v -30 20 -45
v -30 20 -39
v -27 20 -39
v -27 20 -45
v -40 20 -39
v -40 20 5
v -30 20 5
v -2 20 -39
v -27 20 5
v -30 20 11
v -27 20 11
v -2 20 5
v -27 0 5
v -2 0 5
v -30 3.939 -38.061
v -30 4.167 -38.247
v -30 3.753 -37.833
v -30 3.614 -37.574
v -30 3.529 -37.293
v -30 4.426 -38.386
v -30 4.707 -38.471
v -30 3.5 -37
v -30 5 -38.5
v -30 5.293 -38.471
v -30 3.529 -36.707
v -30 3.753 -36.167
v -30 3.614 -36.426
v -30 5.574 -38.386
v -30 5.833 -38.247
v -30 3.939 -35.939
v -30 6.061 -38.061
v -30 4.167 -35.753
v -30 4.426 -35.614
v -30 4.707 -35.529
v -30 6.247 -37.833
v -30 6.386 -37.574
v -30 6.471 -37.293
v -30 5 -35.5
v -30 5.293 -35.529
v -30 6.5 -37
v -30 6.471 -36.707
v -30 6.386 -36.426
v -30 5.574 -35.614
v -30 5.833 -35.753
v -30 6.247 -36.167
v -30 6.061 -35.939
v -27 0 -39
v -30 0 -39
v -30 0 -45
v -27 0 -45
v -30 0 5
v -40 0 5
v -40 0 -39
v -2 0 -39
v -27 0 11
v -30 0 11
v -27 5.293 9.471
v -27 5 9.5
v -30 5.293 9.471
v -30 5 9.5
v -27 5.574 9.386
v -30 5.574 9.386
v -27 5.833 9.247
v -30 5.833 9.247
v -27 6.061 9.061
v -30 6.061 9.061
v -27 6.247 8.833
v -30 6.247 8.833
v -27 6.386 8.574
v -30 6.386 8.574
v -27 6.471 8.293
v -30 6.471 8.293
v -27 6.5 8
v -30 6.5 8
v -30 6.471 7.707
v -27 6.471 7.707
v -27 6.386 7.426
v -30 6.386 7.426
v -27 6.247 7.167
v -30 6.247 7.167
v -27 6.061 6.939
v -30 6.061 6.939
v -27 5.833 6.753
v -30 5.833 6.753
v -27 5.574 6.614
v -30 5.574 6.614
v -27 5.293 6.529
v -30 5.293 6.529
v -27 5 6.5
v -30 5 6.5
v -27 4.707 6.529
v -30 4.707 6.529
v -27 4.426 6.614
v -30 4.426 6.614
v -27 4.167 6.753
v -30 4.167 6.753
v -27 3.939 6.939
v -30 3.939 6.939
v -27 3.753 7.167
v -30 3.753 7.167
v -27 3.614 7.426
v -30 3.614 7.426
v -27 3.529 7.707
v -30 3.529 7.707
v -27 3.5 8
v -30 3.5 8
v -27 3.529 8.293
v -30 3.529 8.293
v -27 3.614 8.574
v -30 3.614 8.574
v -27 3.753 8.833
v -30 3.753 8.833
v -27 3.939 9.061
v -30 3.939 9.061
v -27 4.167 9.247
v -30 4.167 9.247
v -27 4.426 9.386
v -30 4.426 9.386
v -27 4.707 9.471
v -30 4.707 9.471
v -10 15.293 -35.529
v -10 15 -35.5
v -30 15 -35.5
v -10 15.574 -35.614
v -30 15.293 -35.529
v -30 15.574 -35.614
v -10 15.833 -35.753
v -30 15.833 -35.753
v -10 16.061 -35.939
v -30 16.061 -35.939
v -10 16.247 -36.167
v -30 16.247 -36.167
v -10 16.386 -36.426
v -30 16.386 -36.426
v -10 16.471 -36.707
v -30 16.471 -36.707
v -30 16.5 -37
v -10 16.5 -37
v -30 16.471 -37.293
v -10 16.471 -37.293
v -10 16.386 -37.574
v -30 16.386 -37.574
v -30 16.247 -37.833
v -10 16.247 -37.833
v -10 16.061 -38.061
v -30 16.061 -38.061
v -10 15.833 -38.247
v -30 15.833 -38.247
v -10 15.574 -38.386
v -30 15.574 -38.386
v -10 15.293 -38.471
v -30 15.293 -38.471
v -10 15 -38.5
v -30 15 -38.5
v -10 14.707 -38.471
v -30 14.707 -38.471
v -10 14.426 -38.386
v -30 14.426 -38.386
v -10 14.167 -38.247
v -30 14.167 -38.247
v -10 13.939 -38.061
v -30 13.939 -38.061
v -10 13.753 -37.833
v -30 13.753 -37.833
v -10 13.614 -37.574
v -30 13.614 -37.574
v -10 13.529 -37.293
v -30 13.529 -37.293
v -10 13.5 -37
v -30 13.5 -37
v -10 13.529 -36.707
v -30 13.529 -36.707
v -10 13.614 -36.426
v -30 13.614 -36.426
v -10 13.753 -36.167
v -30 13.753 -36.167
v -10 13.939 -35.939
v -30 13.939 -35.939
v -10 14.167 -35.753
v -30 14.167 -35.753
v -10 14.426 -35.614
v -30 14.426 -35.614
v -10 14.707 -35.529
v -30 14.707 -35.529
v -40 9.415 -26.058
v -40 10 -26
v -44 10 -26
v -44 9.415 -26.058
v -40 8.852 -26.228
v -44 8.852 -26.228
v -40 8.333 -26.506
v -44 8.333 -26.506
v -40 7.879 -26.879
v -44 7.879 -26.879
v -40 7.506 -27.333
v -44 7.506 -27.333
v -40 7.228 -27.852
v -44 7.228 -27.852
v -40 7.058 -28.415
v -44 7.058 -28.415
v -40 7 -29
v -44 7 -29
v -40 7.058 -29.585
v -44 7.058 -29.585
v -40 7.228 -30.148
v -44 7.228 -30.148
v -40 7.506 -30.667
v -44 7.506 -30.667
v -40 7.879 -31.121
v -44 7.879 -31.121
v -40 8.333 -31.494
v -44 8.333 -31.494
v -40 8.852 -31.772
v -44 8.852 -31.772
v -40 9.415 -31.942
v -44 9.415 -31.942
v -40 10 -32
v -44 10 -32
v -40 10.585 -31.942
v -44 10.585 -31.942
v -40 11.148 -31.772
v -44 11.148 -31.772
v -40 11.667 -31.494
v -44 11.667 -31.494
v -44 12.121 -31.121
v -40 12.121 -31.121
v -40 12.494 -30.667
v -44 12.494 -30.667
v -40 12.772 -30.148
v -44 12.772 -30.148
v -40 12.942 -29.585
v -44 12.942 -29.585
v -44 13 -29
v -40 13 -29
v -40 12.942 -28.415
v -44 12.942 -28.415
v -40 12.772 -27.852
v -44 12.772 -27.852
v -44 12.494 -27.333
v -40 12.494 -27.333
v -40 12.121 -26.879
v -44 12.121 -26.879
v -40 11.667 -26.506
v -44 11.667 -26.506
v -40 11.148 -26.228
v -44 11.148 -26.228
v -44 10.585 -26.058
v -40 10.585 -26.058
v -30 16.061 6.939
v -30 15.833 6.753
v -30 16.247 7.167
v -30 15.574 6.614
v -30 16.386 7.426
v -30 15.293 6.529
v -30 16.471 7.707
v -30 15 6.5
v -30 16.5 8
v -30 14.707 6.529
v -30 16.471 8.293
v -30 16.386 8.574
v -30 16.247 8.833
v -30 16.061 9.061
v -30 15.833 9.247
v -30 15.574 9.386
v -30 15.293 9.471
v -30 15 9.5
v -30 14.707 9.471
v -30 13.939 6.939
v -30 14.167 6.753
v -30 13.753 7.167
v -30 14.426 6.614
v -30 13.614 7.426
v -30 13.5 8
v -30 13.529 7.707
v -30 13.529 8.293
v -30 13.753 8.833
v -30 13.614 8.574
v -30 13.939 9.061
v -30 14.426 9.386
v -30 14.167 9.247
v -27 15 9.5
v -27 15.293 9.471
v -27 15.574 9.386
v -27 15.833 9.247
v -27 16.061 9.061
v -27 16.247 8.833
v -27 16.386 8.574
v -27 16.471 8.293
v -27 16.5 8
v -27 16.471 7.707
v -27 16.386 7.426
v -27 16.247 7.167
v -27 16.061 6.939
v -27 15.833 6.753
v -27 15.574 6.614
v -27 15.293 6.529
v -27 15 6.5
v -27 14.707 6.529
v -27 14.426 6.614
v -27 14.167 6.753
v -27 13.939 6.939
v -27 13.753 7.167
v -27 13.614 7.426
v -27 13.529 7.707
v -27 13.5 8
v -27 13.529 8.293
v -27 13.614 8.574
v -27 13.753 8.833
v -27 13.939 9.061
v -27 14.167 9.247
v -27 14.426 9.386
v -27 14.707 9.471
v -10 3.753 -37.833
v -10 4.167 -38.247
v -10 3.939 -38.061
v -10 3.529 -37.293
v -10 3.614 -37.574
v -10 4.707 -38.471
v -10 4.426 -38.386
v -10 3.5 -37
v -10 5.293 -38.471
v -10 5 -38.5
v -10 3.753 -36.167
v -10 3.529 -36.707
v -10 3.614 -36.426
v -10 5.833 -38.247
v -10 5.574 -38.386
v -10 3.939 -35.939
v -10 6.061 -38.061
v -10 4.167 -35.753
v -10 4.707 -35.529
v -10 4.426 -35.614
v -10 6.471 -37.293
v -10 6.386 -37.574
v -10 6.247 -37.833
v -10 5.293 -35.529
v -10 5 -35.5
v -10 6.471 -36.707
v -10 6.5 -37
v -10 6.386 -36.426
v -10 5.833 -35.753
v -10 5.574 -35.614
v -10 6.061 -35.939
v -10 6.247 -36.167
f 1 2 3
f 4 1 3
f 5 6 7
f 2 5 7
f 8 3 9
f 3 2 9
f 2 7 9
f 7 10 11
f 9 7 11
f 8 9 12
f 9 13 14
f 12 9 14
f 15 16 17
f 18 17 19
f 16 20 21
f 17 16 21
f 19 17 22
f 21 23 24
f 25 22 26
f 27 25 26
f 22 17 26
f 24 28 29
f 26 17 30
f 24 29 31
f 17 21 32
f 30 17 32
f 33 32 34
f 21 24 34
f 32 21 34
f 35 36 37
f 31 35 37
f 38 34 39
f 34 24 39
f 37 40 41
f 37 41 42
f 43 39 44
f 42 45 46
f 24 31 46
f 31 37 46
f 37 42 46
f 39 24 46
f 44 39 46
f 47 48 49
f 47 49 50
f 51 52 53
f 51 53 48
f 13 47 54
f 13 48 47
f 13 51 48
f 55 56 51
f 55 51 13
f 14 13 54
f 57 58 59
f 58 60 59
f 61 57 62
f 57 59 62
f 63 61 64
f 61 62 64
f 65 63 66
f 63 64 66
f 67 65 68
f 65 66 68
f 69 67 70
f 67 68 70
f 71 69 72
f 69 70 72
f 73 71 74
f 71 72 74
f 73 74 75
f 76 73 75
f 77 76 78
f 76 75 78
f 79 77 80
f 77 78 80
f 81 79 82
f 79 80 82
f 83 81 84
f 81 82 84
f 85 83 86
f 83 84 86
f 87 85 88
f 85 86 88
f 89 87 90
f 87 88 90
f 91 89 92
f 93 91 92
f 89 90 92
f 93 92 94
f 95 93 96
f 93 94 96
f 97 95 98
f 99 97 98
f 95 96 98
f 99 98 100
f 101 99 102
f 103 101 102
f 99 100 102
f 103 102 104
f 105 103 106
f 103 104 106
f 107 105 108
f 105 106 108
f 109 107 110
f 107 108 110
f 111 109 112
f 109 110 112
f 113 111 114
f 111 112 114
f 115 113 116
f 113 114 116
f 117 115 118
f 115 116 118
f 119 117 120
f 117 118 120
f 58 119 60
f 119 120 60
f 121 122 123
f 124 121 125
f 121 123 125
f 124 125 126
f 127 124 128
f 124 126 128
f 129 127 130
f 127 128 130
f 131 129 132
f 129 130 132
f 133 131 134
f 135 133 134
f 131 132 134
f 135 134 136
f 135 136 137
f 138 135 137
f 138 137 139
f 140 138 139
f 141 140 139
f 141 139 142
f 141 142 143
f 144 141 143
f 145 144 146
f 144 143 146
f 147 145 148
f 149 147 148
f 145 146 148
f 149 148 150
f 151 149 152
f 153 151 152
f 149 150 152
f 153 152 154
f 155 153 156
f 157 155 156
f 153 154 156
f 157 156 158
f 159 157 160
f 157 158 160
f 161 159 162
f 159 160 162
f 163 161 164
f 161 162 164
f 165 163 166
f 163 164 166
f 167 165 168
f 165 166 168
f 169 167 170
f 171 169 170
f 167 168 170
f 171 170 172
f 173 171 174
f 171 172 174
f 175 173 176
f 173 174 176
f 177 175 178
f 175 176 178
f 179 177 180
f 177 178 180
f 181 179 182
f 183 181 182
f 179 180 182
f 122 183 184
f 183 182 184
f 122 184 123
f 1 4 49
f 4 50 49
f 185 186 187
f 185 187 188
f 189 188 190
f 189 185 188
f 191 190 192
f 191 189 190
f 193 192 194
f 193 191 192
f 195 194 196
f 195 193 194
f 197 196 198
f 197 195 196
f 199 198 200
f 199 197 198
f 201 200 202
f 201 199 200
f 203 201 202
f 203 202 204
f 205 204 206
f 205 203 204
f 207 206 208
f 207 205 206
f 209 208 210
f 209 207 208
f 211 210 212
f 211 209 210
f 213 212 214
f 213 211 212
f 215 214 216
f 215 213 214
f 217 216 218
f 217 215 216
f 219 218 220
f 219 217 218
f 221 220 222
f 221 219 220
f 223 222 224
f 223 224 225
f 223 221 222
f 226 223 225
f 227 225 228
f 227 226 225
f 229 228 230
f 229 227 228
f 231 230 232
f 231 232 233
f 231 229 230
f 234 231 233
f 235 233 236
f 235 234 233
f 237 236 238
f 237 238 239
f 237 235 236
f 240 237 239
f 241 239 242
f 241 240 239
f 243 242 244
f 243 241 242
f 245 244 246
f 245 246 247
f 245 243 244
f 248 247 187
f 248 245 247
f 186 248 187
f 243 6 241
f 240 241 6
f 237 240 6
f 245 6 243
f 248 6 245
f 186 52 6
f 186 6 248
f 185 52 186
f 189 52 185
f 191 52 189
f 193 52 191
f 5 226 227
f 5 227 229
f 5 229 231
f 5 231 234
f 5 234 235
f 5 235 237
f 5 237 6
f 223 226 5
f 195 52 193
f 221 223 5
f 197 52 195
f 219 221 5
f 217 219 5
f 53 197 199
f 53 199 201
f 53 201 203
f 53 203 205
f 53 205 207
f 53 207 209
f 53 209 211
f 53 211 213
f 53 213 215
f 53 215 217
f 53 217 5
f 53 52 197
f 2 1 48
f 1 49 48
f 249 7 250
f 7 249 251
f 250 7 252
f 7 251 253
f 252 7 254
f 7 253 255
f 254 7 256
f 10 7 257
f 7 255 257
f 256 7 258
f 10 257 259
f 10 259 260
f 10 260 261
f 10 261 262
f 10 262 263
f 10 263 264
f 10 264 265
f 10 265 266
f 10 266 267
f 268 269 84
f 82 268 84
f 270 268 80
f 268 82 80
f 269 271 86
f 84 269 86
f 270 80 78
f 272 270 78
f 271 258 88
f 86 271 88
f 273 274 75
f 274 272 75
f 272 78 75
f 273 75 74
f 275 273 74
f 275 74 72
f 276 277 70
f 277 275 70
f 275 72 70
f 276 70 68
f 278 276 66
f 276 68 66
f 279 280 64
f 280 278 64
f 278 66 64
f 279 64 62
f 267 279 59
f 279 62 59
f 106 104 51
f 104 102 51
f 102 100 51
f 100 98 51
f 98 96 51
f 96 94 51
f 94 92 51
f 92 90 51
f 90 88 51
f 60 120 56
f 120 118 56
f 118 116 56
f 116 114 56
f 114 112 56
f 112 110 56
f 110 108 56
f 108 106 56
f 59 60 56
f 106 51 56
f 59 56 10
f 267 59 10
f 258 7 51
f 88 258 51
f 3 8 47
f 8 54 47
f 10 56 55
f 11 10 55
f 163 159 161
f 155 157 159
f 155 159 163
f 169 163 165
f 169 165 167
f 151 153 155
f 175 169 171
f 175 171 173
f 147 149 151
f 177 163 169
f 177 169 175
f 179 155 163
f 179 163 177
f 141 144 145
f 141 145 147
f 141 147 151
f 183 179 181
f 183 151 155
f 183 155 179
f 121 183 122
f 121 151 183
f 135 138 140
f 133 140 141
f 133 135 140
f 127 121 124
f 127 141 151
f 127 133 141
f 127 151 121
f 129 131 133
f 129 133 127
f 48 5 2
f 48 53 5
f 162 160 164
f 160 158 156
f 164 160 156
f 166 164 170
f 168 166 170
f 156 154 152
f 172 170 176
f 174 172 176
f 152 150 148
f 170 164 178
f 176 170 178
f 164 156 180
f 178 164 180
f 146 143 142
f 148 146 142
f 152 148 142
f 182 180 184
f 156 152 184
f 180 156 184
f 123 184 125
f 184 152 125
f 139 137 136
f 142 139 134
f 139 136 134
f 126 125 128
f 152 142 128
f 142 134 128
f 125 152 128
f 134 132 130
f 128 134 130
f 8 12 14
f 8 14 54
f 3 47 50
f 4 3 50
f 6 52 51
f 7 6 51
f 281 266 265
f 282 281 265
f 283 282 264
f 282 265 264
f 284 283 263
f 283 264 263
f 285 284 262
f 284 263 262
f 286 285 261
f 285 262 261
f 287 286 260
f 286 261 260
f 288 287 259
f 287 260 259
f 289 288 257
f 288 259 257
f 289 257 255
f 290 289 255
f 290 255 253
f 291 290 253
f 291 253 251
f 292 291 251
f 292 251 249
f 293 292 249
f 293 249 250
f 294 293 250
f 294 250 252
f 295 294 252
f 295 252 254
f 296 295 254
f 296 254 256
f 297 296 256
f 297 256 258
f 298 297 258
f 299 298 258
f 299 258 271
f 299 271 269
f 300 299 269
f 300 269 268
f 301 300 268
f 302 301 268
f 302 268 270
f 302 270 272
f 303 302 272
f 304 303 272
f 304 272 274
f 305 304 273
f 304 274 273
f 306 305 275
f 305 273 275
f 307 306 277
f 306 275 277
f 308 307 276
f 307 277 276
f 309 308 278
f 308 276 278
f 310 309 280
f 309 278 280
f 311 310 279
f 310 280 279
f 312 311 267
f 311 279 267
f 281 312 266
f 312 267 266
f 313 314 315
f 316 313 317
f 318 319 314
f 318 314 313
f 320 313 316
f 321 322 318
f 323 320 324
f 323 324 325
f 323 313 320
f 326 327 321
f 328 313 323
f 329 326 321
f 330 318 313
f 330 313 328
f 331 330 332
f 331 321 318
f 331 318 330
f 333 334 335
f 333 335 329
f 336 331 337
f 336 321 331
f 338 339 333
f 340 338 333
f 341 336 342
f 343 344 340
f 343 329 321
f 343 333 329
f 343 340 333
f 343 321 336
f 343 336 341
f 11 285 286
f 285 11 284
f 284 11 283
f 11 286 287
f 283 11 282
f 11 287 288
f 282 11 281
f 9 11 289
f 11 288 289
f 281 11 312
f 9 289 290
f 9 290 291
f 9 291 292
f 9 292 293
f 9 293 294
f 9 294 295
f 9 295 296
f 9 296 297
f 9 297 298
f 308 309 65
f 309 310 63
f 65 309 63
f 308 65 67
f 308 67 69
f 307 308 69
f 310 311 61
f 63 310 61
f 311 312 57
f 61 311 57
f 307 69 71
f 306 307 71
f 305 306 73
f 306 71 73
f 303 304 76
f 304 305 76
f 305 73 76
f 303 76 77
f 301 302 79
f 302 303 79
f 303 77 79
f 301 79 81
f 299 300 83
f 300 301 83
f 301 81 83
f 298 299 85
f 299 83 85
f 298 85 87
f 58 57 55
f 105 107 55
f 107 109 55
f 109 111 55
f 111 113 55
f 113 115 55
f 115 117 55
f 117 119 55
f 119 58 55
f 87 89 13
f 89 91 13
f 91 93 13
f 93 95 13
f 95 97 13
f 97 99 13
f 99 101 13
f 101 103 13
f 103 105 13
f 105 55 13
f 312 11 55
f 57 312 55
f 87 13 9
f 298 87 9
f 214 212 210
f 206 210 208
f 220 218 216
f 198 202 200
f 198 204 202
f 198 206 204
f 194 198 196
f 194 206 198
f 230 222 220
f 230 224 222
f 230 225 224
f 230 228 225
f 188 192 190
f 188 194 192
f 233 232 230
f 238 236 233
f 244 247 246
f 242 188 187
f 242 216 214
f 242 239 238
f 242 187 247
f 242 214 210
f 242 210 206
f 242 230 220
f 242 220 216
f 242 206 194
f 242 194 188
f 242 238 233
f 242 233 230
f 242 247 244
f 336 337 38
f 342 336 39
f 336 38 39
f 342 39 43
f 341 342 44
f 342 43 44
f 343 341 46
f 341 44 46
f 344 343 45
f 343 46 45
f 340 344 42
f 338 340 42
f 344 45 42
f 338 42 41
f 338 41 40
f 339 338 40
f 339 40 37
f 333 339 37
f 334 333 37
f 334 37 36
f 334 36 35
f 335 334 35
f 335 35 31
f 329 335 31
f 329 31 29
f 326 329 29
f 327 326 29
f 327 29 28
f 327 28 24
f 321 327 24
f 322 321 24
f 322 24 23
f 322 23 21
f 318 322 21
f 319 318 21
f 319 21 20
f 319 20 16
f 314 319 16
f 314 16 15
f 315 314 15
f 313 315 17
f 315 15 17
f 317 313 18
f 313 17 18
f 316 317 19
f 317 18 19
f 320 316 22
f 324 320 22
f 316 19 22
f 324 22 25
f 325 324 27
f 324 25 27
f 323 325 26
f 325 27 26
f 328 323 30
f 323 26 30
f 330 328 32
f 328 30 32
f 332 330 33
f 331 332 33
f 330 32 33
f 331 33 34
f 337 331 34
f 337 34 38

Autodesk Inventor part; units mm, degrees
ref_plane "YZ Plane" through (0, 0, 0) normal (1, 0, 0) x (0, 1, 0)
ref_plane "XZ Plane" through (0, 0, 0) normal (0, 1, 0) x (-1, 0, 0)
ref_plane "XY Plane" through (0, 0, 0) normal (0, 0, 1) x (1, 0, 0)
sketch "Sketch1" plane through (0, 0, 0) normal (0, 1, 0) x (-1, 0, 0)
  line L0 (40, 5) -> (40, -39)
  line L1 (0, -39) -> (0, 0)
  line L2 (40, 5) -> (30, 5)
  line L3 (30, 5) -> (30, 11)
  line L4 (30, 11) -> (27, 11)
  line L5 (27, 11) -> (27, 7)
  line L6 (27, -39) -> (27, -45)
  line L7 (27, -45) -> (30, -45)
  line L8 (30, -45) -> (30, -39)
  line L9 (30, 5) -> (40, 5)
  line L10 (40, -39) -> (30, -39)
  line L11 (27, -39) -> (0, -39)
  line L12 (0, 3) -> (0, 0)
  line L13 (0, 5) -> (0, 3)
  line L14 (27, 5) -> (0, 5)
  line L15 (27, 7) -> (27, 5)
  dimension "d0" = 40
  dimension "d1" = 44
  dimension "d2" = 10
  dimension "d3" = 6
  dimension "d4" = 3
  dimension "d5" = 6
extrude "Extrusion1" add sketch "Sketch1" along normal blind 20
sketch "Sketch2" plane through (-30, 0, 5) normal (-1, 0, 0) x (0, 0, 1)
  line L0 (6, 0) -> (6, 20) projected
  line L1 (6, 10) -> (3, 10)
  line L2 (3, 10) -> (3, 15)
  line L3 (3, 15) -> (3, 5)
  circle A0 centre (3, 15) radius 1.5
  circle A1 centre (3, 5) radius 1.5
  circle A2 centre (-42, 15) radius 1.5
  circle A3 centre (-42, 5) radius 1.5
  dimension "d8" = 5
  dimension "d9" = 10
  dimension "d10" = 3
  dimension "d11" = 3
  dimension "d12" = 3
  dimension "d13" = 3
extrude "Extrusion2" cut sketch "Sketch2" against normal blind 20
sketch "Sketch3" plane through (-40, 0, -39) normal (-1, 0, 0) x (0, 0, 1)
  line L0 (0, 0) -> (0, 20) projected
  line L1 (0, 10) -> (10, 10)
  circle A0 centre (10, 10) radius 3
  dimension "d16" = 10
  dimension "d17" = 6
extrude "Extrusion3" add sketch "Sketch3" along normal blind 4
sketch "Sketch4" plane through (0, 0, 0) normal (1, 0, 0) x (0, 0, -1)
  line L0 (-5, 0) -> (39, 0) projected
  line L1 (39, 0) -> (39, 20) projected
  line L2 (-5, 20) -> (39, 20) projected
  line L3 (0, 0) -> (0, 20) projected
extrude "Extrusion4" cut sketch "Sketch4" against normal blind 2
sketch "Sketch5" plane through (0, 0, 0) normal (0, -1, 0) x (1, 0, 0)
  line L0 (-2, 0) -> (0, 0)
  line L1 (0, 0) -> (0, -39)
  line L2 (0, -39) -> (-2, -39)
  line L3 (-2, -39) -> (-2, 0)
extrude "Extrusion5" add sketch "Sketch5" against normal up to surface (20 mm away)
sketch "Sketch6" plane through (0, 0, 5) normal (1, 0, 0) x (0, 0, -1)
  line L0 (44, 20) -> (0, 20) projected
  line L1 (0, 0) -> (0, 20) projected
  line L2 (44, 0) -> (0, 0) projected
  line L3 (44, 0) -> (44, 20) projected
  point P0 (5, 0)
extrude "Extrusion6" cut sketch "Sketch6" against normal blind 2
properties part number "Elbow Servo"
